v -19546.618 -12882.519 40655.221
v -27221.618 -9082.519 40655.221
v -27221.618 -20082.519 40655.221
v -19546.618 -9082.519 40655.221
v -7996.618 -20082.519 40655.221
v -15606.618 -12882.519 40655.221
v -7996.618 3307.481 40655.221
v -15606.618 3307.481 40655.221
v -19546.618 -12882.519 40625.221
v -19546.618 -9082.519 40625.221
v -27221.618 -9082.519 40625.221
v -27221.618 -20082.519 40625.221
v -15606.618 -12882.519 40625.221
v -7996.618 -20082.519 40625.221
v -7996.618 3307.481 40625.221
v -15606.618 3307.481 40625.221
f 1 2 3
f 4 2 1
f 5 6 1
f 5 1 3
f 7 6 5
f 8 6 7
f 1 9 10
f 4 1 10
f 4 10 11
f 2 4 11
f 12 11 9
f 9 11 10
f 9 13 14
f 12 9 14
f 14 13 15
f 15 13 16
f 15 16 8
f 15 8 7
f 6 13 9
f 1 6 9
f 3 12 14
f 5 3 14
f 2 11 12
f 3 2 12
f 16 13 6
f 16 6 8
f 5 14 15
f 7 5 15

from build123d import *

# Parameters (mm, degrees)
SKETCH1_W           = 7610
SKETCH1_H           = 23390
BOSS_EXTRUDE1_DEPTH = 30


with BuildPart() as part:
    # Sketch1 → Boss-Extrude1 (new body)
    with BuildSketch(Plane.XY.offset(40625.220842973)):
        with Locations((-11801.617683291, -8387.518633414)):
            Rectangle(SKETCH1_W, SKETCH1_H)
        Polygon((-15606.617683291, -20082.518633414), (-15606.617683291, -12882.518633414), (-16246.617683291, -12882.518633414), (-19546.617683291, -12882.518633414), (-27221.617683291, -12882.518633414), (-27221.617683291, -20082.518633414), align=None)
        Polygon((-27221.617683291, -12882.518633414), (-19546.617683291, -12882.518633414), (-19546.617683291, -9107.518633414), (-19546.617683291, -9082.518633414), (-27221.617683291, -9082.518633414), align=None)
    extrude(amount=BOSS_EXTRUDE1_DEPTH)


solid = part.part
